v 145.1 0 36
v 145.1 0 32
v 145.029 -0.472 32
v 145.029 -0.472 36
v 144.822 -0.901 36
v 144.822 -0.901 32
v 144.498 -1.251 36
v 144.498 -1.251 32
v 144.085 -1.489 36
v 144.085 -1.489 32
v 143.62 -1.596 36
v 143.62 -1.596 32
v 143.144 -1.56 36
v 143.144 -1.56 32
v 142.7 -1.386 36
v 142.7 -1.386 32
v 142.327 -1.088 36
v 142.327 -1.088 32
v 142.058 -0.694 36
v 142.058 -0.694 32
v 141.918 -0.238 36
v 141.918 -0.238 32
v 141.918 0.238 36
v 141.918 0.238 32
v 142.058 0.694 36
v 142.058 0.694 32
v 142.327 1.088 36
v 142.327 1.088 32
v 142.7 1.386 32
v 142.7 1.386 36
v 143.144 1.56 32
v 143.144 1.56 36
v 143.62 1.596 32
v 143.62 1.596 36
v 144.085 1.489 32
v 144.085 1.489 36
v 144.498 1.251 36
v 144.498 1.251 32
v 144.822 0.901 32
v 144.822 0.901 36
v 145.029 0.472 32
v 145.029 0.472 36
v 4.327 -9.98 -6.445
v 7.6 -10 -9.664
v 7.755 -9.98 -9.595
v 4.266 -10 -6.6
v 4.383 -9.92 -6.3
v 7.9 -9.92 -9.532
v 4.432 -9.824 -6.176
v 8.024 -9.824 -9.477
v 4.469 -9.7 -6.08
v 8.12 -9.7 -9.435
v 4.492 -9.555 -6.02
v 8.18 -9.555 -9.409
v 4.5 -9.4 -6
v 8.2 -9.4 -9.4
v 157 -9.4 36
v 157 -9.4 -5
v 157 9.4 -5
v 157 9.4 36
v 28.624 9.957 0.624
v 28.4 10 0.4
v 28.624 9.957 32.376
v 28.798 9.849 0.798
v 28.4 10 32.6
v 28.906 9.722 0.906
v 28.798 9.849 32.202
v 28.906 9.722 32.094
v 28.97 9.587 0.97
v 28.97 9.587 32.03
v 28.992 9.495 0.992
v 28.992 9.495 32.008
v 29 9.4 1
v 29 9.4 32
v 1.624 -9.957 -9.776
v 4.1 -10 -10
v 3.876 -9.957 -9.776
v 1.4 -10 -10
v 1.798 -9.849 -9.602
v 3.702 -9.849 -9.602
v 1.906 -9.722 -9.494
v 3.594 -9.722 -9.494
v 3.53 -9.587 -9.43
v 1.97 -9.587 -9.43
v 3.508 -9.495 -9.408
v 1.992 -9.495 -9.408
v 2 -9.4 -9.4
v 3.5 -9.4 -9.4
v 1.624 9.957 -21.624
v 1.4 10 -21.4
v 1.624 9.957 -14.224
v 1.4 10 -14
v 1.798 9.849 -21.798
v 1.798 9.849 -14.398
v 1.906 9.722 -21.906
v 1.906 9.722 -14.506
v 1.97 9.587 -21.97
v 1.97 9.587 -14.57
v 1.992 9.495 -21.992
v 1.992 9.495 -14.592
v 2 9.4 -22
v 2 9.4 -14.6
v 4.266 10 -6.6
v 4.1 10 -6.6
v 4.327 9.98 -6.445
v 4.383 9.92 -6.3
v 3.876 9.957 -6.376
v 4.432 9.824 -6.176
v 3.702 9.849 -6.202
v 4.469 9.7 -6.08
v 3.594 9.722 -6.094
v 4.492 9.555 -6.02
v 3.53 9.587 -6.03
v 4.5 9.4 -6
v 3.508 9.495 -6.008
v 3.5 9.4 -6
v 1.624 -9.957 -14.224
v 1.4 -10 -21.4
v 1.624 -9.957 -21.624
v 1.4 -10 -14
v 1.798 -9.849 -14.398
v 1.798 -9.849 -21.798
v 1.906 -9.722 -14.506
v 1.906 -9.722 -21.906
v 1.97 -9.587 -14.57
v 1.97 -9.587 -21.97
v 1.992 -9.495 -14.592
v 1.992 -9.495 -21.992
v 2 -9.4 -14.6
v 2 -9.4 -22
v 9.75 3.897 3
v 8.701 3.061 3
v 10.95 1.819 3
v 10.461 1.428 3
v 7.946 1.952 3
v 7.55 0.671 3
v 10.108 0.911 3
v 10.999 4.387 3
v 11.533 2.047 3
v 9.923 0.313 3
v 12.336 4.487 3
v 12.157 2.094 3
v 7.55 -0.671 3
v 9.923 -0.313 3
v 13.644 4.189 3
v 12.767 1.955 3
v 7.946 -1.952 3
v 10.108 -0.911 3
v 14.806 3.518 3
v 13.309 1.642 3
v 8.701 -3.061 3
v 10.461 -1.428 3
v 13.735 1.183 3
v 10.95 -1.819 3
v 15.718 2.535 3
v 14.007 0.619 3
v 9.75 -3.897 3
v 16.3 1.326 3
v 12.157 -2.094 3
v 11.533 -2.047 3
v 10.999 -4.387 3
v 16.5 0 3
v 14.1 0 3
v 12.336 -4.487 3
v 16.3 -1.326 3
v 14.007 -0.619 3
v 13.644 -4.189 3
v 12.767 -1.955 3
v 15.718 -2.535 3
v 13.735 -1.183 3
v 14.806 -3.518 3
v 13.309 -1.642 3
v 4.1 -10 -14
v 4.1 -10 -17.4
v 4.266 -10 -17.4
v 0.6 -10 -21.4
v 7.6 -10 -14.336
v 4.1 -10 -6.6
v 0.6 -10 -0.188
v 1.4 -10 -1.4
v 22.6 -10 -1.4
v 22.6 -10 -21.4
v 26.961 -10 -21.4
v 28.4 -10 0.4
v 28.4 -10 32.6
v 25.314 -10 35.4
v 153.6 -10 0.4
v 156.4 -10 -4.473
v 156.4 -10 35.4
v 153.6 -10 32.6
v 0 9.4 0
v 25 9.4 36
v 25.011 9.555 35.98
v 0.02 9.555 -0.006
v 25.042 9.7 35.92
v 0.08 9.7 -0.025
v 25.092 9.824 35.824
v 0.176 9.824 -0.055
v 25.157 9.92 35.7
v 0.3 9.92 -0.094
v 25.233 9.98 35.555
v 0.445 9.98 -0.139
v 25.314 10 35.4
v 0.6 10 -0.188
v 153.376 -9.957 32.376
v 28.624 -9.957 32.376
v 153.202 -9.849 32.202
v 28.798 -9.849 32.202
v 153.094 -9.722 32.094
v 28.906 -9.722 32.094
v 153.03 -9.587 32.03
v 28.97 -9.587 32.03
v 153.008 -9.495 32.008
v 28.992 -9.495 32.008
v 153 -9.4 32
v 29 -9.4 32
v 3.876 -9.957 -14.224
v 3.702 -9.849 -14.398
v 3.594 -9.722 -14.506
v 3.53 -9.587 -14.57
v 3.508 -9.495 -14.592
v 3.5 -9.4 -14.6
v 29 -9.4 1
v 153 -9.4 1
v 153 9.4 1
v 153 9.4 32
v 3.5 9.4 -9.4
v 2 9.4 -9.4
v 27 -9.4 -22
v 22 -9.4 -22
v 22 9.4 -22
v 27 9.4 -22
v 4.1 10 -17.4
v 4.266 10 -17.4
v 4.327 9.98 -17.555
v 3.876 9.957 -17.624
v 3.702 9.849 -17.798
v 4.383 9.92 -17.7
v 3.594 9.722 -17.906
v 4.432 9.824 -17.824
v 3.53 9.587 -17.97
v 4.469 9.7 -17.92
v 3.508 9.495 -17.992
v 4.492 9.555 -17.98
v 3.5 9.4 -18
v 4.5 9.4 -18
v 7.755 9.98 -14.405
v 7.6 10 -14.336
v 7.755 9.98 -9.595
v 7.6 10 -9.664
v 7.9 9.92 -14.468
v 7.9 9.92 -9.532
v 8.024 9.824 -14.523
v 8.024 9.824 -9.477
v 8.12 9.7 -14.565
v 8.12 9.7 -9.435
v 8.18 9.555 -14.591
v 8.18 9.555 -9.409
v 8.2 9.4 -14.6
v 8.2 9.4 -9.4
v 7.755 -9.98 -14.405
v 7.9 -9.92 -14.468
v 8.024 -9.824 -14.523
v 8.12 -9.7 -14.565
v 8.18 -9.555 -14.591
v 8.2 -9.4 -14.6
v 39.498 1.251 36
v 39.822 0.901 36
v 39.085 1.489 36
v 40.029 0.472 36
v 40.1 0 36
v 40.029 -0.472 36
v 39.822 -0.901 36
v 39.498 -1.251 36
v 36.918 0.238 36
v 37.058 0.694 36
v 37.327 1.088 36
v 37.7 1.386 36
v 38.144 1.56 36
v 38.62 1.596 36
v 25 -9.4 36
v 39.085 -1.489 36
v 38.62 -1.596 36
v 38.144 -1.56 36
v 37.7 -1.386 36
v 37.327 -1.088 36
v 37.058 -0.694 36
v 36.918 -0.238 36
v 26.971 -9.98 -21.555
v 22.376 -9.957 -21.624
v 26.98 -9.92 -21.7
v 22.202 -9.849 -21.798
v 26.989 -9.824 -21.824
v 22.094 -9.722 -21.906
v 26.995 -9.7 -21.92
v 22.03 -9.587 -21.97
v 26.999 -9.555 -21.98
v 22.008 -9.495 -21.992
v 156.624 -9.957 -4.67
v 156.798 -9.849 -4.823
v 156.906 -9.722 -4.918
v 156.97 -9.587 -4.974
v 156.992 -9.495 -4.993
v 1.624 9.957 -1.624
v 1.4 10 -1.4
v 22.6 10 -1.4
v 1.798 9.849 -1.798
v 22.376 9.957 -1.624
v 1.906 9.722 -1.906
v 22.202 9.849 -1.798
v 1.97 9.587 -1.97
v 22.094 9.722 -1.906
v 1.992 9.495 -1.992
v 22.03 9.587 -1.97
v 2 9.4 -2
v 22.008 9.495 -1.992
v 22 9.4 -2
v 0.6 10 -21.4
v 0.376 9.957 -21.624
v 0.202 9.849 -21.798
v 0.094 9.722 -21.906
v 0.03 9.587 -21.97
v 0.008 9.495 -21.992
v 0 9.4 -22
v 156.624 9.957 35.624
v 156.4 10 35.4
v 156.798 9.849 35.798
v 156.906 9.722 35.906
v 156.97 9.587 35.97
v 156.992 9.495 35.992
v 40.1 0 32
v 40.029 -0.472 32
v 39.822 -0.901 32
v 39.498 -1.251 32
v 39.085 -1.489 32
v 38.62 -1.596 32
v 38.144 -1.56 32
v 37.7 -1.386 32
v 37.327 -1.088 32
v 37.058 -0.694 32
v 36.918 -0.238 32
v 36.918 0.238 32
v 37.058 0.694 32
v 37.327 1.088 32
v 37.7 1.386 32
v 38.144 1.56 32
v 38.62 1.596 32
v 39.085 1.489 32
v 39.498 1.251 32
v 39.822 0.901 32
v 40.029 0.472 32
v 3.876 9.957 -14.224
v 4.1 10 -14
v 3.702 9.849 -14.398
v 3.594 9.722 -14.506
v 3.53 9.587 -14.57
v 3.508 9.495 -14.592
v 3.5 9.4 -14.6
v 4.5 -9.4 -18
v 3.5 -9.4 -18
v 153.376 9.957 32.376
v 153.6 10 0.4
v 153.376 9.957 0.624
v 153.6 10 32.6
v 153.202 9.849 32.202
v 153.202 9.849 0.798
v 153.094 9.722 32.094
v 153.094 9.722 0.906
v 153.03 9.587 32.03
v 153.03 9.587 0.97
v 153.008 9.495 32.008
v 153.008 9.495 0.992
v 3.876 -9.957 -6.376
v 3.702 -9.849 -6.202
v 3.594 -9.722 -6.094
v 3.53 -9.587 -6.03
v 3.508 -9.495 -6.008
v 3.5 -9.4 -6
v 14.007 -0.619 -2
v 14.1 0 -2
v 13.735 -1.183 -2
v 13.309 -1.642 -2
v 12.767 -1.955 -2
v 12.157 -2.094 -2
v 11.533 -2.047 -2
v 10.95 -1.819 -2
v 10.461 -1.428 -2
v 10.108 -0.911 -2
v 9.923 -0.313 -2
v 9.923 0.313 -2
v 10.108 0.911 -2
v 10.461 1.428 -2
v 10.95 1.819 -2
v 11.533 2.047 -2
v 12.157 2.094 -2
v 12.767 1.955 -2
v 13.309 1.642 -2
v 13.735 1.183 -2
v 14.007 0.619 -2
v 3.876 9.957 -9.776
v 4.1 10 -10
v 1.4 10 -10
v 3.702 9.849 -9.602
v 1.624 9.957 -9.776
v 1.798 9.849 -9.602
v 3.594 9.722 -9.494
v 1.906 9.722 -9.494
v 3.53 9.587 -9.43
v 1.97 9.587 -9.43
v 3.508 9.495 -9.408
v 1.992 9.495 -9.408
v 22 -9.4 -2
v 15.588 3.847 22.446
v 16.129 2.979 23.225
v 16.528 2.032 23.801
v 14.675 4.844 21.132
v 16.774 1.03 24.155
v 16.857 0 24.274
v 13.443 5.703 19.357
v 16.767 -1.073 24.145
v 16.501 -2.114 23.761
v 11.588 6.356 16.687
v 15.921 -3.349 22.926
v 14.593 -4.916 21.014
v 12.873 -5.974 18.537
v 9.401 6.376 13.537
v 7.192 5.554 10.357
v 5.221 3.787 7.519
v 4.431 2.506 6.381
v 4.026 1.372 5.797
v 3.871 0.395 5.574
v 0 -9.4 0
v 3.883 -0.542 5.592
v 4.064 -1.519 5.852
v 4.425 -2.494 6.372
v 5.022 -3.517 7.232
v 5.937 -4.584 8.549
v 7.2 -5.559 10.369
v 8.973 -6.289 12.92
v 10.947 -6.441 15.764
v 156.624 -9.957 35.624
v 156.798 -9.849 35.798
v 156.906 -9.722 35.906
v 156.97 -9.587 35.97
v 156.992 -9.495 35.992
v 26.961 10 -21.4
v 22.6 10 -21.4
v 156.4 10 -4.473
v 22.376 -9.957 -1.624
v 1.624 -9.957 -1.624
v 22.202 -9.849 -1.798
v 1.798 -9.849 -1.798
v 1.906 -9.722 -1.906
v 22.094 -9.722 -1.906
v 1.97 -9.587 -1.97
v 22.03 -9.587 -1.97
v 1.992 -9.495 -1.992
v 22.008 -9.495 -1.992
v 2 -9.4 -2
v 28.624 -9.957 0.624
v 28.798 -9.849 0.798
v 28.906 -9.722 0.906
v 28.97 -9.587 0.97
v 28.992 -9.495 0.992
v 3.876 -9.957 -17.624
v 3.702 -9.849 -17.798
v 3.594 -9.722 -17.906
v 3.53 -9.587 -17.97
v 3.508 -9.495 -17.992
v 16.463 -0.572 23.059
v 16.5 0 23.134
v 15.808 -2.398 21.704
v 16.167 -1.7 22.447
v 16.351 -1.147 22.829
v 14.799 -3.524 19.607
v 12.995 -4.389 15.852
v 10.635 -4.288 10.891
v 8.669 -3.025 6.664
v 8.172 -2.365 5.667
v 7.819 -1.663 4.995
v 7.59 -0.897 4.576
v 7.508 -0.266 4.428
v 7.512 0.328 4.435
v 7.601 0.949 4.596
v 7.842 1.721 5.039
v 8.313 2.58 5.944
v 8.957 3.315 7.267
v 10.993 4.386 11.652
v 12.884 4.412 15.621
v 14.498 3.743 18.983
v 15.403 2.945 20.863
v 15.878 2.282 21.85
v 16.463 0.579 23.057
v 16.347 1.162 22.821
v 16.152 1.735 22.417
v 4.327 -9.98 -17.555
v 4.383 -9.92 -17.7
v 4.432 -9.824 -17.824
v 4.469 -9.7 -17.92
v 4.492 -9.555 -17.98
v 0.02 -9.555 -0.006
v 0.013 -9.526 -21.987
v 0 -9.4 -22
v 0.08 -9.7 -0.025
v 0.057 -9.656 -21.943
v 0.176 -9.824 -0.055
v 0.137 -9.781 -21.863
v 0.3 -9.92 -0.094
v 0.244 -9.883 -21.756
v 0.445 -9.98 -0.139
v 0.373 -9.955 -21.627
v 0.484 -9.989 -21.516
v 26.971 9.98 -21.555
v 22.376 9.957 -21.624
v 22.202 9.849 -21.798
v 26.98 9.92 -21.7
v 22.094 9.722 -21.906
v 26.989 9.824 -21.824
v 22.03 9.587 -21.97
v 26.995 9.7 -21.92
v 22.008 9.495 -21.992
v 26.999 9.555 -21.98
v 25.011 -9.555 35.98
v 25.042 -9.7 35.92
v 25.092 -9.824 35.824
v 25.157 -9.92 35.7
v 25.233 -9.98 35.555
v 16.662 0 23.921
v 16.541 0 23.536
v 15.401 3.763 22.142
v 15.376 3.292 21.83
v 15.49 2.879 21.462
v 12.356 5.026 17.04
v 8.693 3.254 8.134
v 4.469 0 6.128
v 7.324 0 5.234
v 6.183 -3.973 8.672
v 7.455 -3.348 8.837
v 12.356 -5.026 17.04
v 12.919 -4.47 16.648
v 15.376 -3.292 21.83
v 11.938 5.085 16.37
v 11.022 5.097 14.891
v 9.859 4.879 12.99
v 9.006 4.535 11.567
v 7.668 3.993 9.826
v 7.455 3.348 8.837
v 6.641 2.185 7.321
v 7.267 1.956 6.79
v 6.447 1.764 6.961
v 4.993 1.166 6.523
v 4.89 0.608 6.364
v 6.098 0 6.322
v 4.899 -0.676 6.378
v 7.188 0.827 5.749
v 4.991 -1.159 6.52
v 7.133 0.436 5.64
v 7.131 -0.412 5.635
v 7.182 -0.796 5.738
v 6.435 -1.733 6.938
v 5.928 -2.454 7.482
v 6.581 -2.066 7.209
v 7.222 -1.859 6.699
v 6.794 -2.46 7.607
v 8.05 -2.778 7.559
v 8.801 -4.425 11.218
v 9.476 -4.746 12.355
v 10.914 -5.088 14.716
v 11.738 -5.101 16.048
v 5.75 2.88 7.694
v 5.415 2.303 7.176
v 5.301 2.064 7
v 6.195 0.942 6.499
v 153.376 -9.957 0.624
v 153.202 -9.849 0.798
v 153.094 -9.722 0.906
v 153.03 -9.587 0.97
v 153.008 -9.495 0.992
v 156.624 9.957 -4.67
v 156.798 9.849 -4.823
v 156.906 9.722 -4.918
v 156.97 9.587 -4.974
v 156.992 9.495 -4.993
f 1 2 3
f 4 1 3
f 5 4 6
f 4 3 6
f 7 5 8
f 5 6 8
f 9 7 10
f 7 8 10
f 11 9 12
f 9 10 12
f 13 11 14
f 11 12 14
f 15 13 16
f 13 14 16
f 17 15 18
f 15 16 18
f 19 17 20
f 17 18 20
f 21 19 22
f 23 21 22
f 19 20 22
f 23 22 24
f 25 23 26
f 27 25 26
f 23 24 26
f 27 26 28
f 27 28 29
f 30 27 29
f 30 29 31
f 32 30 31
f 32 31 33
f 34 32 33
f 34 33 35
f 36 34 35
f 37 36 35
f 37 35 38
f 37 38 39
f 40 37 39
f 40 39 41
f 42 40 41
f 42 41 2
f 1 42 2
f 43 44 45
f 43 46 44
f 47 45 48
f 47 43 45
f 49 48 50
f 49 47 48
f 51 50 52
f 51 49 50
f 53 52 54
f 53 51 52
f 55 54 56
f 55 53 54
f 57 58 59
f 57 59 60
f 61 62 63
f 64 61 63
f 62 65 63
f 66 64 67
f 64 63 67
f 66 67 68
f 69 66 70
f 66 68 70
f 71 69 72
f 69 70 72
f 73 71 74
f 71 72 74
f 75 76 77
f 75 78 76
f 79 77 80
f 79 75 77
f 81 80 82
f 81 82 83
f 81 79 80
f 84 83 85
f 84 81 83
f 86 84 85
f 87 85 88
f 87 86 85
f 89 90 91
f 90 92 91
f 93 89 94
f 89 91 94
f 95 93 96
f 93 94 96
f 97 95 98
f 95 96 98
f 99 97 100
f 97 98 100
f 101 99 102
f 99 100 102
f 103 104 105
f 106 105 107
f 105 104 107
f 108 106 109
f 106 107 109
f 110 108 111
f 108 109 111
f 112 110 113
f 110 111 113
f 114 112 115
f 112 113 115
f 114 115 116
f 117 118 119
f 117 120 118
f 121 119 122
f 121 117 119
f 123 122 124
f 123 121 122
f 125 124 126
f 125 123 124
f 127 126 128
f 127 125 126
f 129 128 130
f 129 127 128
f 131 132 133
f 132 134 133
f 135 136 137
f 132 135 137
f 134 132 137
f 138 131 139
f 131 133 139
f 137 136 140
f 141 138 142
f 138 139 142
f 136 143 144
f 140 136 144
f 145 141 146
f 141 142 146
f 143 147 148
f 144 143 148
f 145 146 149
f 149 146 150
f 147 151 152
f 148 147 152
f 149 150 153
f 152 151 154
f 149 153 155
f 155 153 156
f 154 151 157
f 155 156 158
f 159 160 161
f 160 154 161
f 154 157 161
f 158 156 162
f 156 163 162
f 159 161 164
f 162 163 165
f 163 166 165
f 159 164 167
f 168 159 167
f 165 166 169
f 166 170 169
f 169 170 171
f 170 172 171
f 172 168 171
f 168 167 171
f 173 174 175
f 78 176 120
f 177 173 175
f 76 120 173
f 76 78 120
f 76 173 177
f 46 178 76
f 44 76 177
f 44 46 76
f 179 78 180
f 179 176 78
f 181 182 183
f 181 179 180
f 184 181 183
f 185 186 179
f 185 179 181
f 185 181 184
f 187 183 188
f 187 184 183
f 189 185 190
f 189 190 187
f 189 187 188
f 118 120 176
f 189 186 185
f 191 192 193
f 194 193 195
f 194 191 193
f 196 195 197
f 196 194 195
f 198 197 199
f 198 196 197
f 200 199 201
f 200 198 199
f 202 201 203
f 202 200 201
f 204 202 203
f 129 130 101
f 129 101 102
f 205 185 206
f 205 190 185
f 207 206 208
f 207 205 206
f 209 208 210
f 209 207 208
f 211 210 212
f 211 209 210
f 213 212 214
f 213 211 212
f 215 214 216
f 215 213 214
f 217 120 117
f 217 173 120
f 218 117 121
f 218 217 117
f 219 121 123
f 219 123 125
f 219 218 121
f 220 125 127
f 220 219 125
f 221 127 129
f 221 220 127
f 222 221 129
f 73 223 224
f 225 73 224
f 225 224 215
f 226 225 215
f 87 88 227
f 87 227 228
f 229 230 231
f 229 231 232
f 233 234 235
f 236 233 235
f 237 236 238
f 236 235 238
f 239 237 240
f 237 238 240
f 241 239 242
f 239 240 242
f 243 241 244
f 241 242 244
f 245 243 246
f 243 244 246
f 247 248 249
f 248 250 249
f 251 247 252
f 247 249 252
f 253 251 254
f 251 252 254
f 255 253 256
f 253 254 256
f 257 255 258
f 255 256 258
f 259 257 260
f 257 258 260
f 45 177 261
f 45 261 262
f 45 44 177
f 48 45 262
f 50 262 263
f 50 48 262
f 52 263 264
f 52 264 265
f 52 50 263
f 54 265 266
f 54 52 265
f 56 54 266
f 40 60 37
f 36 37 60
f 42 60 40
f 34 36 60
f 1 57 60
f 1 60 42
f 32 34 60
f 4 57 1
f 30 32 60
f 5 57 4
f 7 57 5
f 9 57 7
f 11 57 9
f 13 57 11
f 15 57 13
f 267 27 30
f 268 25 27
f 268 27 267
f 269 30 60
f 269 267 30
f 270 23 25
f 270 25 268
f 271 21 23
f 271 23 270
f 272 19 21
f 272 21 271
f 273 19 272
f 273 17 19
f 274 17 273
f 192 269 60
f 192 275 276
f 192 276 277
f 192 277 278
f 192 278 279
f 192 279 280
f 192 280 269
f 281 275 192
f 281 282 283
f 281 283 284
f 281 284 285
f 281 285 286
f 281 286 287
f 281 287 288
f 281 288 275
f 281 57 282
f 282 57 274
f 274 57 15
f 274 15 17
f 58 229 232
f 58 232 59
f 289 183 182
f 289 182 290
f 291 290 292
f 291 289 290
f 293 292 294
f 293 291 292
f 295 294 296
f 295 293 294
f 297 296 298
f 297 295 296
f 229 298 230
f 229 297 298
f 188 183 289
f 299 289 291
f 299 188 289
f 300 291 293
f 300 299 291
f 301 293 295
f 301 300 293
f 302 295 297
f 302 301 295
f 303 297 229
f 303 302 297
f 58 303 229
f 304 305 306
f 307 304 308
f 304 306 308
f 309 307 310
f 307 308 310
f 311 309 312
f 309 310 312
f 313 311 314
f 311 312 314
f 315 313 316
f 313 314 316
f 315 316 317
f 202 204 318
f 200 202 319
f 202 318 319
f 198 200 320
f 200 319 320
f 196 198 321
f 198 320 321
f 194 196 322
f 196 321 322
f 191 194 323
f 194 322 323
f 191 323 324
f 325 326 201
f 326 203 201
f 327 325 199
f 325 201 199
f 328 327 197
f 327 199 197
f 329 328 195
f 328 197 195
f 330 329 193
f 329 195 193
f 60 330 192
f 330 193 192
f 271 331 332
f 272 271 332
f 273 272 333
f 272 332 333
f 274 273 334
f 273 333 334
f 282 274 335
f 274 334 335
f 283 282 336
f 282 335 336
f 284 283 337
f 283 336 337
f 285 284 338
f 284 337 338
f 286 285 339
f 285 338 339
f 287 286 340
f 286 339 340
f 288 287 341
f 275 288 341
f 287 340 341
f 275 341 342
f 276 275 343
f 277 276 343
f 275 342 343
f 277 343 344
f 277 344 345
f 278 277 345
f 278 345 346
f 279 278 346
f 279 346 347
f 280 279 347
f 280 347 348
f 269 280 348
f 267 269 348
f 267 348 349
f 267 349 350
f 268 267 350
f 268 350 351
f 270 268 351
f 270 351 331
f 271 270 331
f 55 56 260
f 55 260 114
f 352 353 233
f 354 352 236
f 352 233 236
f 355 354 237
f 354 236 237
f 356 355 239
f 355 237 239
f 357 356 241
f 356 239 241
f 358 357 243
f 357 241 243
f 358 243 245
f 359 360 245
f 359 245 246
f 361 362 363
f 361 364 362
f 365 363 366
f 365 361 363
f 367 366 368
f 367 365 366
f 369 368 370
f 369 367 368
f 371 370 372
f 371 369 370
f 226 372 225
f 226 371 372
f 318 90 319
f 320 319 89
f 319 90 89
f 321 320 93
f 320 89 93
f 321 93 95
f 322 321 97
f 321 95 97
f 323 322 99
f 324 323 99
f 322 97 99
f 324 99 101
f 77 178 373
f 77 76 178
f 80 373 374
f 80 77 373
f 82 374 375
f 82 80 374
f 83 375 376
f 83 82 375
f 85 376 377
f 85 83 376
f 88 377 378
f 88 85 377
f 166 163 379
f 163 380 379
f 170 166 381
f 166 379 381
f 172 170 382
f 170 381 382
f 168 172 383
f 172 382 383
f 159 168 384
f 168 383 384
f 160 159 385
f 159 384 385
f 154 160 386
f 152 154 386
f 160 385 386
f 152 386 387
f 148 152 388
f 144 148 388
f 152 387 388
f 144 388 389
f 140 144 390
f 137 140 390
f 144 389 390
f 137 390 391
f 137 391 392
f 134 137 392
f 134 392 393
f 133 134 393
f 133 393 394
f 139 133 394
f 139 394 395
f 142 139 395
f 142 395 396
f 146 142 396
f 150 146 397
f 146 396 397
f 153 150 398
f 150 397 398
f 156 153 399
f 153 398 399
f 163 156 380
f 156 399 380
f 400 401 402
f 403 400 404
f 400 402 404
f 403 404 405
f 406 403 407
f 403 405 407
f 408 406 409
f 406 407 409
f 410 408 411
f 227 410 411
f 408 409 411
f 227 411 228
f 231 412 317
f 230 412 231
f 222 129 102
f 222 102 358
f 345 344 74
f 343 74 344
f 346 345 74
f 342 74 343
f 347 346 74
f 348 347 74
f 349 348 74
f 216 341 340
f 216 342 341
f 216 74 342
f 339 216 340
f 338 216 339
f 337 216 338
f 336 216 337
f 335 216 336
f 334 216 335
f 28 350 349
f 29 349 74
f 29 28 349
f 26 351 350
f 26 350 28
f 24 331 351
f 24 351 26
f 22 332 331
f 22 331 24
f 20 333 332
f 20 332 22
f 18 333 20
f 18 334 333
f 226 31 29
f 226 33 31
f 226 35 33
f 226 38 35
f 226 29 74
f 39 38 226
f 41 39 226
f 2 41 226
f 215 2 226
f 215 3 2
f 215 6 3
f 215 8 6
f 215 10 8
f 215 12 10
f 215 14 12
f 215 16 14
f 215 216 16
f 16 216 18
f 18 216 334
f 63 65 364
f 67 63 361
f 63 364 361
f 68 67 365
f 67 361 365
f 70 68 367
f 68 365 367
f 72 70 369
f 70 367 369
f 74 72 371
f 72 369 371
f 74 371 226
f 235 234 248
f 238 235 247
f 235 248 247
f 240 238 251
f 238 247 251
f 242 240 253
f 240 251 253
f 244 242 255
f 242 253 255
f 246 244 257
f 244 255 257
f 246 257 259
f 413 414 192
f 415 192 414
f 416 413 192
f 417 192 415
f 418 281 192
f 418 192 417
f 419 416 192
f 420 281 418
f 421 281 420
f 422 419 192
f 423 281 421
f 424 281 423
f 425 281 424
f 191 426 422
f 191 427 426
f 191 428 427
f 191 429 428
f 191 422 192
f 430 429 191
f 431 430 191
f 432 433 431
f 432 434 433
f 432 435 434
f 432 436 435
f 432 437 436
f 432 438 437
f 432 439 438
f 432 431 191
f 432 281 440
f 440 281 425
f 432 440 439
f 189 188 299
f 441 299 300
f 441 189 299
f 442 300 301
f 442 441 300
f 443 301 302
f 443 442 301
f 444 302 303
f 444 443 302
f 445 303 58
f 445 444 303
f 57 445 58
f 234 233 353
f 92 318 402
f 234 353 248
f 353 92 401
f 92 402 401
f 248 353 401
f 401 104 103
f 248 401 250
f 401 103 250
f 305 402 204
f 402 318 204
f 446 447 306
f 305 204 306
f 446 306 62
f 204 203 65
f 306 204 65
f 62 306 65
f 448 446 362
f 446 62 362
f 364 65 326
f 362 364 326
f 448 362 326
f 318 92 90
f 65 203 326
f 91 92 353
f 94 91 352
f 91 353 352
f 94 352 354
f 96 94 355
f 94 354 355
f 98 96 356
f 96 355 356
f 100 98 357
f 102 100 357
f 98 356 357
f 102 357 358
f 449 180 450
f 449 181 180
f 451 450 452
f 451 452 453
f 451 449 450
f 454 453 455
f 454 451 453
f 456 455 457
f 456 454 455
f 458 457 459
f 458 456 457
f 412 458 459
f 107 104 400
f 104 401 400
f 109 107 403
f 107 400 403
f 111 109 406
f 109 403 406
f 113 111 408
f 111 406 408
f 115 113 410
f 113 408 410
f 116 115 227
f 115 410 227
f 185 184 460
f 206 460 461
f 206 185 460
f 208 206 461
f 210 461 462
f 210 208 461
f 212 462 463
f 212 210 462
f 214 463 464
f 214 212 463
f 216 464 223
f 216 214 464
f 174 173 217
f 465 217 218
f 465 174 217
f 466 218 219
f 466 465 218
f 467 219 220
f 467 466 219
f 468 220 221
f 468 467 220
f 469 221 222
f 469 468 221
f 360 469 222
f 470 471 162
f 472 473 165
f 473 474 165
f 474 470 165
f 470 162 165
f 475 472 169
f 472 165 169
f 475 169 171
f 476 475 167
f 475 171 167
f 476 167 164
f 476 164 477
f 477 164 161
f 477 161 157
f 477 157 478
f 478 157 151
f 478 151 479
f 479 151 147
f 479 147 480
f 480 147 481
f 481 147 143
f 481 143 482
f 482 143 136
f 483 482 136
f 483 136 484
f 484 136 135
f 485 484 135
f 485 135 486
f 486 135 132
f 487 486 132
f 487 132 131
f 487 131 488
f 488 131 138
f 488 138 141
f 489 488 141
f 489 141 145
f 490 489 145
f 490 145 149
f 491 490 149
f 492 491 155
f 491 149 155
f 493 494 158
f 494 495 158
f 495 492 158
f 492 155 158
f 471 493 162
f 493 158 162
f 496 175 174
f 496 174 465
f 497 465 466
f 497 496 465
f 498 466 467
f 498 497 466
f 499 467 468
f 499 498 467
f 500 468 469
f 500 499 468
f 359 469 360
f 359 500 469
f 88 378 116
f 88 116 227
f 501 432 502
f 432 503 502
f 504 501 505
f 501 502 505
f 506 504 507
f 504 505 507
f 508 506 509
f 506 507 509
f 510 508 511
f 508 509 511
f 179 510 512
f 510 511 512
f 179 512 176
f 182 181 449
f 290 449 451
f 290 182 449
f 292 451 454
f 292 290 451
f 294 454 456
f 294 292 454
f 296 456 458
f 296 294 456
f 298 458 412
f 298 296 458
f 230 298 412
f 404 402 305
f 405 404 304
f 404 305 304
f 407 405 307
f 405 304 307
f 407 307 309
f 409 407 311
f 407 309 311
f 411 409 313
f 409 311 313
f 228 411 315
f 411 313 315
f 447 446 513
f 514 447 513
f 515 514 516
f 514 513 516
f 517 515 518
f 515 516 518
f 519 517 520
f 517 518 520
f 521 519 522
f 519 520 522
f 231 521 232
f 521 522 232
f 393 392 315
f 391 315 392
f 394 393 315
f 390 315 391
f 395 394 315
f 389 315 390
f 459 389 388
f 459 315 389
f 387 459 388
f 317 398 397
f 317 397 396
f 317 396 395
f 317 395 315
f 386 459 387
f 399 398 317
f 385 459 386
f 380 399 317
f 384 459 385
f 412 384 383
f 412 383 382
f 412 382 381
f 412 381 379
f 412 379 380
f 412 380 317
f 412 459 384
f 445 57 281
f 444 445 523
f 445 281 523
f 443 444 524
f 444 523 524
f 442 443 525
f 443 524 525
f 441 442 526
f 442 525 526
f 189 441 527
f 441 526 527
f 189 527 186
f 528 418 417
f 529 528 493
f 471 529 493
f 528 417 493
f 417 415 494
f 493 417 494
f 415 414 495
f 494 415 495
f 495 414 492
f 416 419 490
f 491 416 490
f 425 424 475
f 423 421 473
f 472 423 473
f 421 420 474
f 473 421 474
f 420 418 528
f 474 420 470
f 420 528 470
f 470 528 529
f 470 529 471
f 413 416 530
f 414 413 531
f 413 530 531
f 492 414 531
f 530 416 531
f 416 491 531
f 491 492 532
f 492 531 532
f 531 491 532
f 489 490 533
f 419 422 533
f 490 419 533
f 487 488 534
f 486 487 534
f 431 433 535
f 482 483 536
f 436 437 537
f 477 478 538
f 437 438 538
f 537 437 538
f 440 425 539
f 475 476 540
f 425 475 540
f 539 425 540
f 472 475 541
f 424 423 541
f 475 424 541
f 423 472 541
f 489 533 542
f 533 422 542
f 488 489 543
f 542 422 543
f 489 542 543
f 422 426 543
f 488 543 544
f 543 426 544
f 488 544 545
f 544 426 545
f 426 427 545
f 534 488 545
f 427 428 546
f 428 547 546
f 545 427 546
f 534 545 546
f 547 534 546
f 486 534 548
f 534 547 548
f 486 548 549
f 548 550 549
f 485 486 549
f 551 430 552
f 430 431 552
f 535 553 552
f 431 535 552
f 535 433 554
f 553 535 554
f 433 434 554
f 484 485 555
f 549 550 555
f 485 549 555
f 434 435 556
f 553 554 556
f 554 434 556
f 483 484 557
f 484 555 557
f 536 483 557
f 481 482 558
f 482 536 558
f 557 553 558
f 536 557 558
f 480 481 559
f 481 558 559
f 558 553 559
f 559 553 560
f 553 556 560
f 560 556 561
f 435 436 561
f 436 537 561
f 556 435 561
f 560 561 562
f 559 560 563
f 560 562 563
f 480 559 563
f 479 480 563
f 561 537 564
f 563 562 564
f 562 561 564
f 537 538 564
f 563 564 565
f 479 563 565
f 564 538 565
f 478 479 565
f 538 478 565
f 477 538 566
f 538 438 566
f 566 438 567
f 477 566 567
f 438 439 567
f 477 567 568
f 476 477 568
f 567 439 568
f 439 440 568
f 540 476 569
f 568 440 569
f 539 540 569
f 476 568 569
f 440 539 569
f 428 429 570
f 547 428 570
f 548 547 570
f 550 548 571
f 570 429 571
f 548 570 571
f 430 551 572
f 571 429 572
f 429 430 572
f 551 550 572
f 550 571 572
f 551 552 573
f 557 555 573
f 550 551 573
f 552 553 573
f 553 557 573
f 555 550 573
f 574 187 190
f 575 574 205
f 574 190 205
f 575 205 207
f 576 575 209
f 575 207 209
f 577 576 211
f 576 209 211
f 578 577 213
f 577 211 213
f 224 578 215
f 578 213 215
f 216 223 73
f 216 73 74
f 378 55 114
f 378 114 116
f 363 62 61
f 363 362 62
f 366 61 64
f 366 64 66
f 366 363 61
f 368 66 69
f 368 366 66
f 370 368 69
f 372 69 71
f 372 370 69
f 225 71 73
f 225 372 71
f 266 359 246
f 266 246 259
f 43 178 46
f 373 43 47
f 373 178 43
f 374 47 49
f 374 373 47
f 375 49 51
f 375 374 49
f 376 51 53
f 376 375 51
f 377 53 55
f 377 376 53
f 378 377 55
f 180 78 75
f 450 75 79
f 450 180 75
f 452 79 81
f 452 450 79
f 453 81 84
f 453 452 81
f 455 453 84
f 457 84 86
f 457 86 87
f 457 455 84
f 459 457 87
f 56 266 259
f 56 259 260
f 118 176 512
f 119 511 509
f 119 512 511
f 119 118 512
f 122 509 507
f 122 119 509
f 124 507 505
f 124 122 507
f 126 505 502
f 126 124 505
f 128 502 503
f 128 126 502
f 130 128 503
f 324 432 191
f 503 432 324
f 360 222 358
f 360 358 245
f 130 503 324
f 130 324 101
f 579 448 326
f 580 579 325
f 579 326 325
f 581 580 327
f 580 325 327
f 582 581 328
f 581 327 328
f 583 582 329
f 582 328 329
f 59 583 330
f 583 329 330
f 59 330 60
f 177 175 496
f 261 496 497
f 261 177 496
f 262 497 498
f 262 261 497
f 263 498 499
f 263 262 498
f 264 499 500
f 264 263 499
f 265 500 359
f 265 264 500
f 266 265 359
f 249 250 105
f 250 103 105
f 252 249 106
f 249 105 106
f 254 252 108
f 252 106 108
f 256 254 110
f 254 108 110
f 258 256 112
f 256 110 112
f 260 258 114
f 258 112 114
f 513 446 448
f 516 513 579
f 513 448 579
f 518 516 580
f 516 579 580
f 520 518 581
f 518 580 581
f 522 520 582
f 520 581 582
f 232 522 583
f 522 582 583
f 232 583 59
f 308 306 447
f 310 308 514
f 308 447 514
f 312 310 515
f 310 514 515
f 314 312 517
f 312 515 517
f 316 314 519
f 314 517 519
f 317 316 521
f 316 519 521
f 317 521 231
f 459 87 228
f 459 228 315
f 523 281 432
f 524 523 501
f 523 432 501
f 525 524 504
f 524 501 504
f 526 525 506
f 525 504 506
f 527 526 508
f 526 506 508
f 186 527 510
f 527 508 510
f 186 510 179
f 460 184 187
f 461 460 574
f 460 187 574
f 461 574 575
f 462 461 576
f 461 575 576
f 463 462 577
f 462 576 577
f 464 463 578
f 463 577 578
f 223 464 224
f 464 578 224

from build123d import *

# Parameters (mm, degrees)
SKETCH_W          = 124
SKETCH_H          = 31
PAD_DEPTH         = 10
SKETCH001_R       = 2.1
POCKET_DEPTH      = 33.001
POCKET_DEPTH_BACK = 25.001
SKETCH002_R       = 4.5
POCKET001_DEPTH   = 33.001
FILLET_R          = 2
SKETCH003_R       = 1.6
POCKET002_DEPTH   = 4.001
FILLET001_R       = 0.6


with BuildPart() as part:
    # Sketch → Pad (new body, symmetric)
    with BuildSketch(Plane.XZ):
        Polygon((0, 0), (0, -22), (2, -22), (2, -14.6), (3.5, -14.6), (3.5, -18), (4.5, -18), (8.2, -14.6), (8.2, -9.4), (4.5, -6), (3.5, -6), (3.5, -9.4), (2, -9.4), (2, -2), (22, -2), (22, -22), (27, -22), (157, -5), (157, 0), (157, 36), (25, 36), align=None)
        with Locations((91, 16.5)):
            Rectangle(SKETCH_W, SKETCH_H, mode=Mode.SUBTRACT)
    extrude(amount=PAD_DEPTH, both=True)

    # Sketch001 (on Face14 of Pad) → Pocket (cut, two sides)
    with BuildSketch(Plane(origin=(0, 0, 3), x_dir=(1, 0, 0), z_dir=(0, 0, -1))) as pocket_sk:
        with Locations((12, 0)):
            Circle(SKETCH001_R)
    extrude(amount=-POCKET_DEPTH, mode=Mode.SUBTRACT)
    extrude(pocket_sk.sketch, amount=POCKET_DEPTH_BACK, mode=Mode.SUBTRACT)

    # Sketch002 (on Face14 of Pad) → Pocket001 (cut, through all)
    with BuildSketch(Plane(origin=(0, 0, 3), x_dir=(1, 0, 0), z_dir=(0, 0, -1))):
        with Locations((12, 0)):
            Circle(SKETCH002_R)
    extrude(amount=-POCKET001_DEPTH, mode=Mode.SUBTRACT)

    # Fillet
    fillet_edges = [part.edges().sort_by_distance(p)[0] for p in [
        (7.500022, -0.014101, 10.800032),
    ]]
    fillet(fillet_edges, radius=FILLET_R)

    # Sketch003 (on Face25 of Fillet) → Pocket002 (cut, through all)
    with BuildSketch(Plane(origin=(0, 0, 32), x_dir=(1, 0, 0), z_dir=(0, 0, -1))):
        with Locations((38.5, 0)):
            Circle(SKETCH003_R)
        with Locations((143.5, 0)):
            Circle(SKETCH003_R)
    extrude(amount=-POCKET002_DEPTH, mode=Mode.SUBTRACT)

    # Fillet001
    fillet001_edges = [part.edges().sort_by_distance(p)[0] for p in [
        (0, -10, -11),
        (1, -10, -22),
        (2, -10, -18.3),
        (2.75, -10, -14.6),
        (3.5, -10, -16.3),
        (4, -10, -18),
        (6.35, -10, -16.3),
        (8.2, -10, -12),
        (6.35, -10, -7.7),
        (4, -10, -6),
        (3.5, -10, -7.7),
        (2.75, -10, -9.4),
        (2, -10, -5.7),
        (12, -10, -2),
        (22, -10, -12),
        (24.5, -10, -22),
        (92, -10, -13.5),
        (157, -10, 15.5),
        (91, -10, 36),
        (12.5, -10, 18),
        (91, -10, 32),
        (153, -10, 16.5),
        (91, -10, 1),
        (29, -10, 16.5),
        (0, 10, -11),
        (1, 10, -22),
        (2, 10, -18.3),
        (2.75, 10, -14.6),
        (3.5, 10, -16.3),
        (4, 10, -18),
        (6.35, 10, -16.3),
        (8.2, 10, -12),
        (6.35, 10, -7.7),
        (4, 10, -6),
        (3.5, 10, -7.7),
        (2.75, 10, -9.4),
        (2, 10, -5.7),
        (12, 10, -2),
        (22, 10, -12),
        (24.5, 10, -22),
        (92, 10, -13.5),
        (157, 10, 15.5),
        (91, 10, 36),
        (12.5, 10, 18),
        (91, 10, 32),
        (153, 10, 16.5),
        (91, 10, 1),
        (29, 10, 16.5),
    ]]
    fillet(fillet001_edges, radius=FILLET001_R)


solid = part.part
